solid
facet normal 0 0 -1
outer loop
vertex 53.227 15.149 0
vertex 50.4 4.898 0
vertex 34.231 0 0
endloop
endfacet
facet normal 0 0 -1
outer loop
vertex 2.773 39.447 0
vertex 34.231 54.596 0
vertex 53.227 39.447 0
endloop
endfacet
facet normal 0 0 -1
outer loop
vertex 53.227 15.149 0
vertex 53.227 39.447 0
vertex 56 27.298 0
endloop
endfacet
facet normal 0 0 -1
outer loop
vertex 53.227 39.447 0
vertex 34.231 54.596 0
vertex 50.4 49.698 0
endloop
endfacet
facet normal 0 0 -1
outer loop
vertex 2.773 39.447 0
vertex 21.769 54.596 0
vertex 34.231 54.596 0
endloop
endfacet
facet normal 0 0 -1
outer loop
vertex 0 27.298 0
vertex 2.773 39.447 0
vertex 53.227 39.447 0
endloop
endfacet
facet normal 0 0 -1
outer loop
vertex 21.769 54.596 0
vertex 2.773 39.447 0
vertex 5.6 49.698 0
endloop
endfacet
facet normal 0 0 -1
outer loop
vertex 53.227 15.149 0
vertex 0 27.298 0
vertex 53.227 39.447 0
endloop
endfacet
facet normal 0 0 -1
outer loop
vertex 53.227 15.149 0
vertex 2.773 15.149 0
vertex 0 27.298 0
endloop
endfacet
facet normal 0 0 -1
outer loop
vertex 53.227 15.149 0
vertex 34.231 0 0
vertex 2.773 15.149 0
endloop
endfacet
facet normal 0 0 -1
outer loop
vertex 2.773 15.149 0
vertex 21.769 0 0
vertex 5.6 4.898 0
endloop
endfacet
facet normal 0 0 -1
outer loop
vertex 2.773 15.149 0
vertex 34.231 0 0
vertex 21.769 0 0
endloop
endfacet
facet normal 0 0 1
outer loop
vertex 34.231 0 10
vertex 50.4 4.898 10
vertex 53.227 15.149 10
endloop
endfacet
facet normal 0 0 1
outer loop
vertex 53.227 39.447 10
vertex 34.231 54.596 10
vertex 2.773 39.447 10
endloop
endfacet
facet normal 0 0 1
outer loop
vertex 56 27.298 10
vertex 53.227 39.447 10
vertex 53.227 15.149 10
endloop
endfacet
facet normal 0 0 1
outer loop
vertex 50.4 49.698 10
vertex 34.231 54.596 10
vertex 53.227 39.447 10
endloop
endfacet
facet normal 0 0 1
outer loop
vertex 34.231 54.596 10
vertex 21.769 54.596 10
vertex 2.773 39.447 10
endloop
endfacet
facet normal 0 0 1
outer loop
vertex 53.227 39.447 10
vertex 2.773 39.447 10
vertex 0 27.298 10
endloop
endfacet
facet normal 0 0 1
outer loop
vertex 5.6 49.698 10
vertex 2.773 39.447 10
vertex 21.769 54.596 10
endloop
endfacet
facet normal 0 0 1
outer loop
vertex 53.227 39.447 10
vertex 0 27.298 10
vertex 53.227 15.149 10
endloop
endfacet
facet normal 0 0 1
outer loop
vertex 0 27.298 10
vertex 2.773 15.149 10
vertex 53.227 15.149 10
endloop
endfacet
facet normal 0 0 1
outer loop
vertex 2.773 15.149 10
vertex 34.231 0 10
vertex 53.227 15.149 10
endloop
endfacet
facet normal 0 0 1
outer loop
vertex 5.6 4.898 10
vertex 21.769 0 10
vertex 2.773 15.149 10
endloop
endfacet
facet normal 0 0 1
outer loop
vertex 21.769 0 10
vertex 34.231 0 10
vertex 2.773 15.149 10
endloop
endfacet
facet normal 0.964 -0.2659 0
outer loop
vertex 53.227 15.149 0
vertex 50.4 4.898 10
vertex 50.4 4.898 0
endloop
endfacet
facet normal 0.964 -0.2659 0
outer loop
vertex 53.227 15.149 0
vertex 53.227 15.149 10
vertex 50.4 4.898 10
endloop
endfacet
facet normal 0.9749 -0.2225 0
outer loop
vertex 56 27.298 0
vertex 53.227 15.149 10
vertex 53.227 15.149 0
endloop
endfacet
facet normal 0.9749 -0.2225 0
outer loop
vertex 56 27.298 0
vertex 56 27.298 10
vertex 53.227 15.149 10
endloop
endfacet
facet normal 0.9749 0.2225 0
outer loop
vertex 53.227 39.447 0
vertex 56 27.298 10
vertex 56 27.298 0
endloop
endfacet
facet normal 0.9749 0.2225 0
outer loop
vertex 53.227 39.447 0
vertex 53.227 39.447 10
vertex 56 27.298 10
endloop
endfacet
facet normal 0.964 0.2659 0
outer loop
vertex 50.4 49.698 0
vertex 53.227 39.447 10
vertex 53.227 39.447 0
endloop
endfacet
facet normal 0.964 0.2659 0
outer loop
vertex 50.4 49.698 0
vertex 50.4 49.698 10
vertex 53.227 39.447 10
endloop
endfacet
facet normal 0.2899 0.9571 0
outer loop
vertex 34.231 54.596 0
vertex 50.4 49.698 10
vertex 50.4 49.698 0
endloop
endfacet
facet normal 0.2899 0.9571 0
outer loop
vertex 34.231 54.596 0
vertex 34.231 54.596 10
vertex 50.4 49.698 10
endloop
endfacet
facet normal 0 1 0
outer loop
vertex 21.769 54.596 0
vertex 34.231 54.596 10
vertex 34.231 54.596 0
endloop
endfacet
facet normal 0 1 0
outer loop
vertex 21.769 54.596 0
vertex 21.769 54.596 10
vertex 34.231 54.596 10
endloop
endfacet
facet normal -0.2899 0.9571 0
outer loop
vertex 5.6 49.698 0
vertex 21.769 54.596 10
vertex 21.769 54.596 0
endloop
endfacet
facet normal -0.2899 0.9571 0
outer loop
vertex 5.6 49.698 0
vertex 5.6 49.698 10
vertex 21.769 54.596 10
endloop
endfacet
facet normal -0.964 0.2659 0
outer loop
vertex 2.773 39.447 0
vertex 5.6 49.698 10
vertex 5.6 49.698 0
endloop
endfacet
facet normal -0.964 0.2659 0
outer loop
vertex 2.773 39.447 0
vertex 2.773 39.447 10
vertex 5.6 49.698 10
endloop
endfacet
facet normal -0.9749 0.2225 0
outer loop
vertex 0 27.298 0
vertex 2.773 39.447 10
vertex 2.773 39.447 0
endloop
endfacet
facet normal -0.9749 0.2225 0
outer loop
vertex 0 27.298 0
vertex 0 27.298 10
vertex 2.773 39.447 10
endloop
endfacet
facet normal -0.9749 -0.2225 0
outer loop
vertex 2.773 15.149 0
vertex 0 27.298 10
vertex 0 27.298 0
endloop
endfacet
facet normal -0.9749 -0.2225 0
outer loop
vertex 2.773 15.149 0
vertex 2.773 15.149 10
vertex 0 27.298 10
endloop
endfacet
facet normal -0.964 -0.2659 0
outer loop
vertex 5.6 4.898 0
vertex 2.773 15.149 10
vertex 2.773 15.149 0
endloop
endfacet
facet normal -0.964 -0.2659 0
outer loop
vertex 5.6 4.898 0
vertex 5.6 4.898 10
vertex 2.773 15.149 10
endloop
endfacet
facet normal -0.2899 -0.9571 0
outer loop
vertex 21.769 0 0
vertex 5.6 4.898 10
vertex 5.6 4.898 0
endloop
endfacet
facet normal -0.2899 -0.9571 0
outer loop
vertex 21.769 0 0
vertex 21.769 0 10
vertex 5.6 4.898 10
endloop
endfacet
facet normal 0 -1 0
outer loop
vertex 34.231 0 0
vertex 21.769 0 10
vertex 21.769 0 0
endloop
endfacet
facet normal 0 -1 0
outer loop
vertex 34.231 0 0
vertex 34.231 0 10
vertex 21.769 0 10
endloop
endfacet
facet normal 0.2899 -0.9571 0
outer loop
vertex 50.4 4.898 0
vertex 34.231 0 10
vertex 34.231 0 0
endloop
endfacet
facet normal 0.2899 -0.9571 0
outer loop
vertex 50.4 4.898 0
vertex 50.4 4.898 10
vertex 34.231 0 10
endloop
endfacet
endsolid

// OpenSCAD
$fn = 32;

// ----------------------------------------------------------------------
// Flat adaptor: hex_disc, 10 mm thick
// ----------------------------------------------------------------------

// --- parameters (mm) ---
profile_height = 10;      // extrusion height
profile_points = 14;      // points of the closed outline

profile = [[0, 27.298], [2.773, 15.149], [5.6, 4.898], [21.769, 0], [34.231, 0], [50.4, 4.898], [53.227, 15.149], [56, 27.298], [53.227, 39.447], [50.4, 49.698], [34.231, 54.596], [21.769, 54.596], [5.6, 49.698], [2.773, 39.447]];  // single closed polygon, 14 points, counter clockwise

// --- the one profile operation ---
linear_extrude(height = profile_height) polygon(points = profile);
